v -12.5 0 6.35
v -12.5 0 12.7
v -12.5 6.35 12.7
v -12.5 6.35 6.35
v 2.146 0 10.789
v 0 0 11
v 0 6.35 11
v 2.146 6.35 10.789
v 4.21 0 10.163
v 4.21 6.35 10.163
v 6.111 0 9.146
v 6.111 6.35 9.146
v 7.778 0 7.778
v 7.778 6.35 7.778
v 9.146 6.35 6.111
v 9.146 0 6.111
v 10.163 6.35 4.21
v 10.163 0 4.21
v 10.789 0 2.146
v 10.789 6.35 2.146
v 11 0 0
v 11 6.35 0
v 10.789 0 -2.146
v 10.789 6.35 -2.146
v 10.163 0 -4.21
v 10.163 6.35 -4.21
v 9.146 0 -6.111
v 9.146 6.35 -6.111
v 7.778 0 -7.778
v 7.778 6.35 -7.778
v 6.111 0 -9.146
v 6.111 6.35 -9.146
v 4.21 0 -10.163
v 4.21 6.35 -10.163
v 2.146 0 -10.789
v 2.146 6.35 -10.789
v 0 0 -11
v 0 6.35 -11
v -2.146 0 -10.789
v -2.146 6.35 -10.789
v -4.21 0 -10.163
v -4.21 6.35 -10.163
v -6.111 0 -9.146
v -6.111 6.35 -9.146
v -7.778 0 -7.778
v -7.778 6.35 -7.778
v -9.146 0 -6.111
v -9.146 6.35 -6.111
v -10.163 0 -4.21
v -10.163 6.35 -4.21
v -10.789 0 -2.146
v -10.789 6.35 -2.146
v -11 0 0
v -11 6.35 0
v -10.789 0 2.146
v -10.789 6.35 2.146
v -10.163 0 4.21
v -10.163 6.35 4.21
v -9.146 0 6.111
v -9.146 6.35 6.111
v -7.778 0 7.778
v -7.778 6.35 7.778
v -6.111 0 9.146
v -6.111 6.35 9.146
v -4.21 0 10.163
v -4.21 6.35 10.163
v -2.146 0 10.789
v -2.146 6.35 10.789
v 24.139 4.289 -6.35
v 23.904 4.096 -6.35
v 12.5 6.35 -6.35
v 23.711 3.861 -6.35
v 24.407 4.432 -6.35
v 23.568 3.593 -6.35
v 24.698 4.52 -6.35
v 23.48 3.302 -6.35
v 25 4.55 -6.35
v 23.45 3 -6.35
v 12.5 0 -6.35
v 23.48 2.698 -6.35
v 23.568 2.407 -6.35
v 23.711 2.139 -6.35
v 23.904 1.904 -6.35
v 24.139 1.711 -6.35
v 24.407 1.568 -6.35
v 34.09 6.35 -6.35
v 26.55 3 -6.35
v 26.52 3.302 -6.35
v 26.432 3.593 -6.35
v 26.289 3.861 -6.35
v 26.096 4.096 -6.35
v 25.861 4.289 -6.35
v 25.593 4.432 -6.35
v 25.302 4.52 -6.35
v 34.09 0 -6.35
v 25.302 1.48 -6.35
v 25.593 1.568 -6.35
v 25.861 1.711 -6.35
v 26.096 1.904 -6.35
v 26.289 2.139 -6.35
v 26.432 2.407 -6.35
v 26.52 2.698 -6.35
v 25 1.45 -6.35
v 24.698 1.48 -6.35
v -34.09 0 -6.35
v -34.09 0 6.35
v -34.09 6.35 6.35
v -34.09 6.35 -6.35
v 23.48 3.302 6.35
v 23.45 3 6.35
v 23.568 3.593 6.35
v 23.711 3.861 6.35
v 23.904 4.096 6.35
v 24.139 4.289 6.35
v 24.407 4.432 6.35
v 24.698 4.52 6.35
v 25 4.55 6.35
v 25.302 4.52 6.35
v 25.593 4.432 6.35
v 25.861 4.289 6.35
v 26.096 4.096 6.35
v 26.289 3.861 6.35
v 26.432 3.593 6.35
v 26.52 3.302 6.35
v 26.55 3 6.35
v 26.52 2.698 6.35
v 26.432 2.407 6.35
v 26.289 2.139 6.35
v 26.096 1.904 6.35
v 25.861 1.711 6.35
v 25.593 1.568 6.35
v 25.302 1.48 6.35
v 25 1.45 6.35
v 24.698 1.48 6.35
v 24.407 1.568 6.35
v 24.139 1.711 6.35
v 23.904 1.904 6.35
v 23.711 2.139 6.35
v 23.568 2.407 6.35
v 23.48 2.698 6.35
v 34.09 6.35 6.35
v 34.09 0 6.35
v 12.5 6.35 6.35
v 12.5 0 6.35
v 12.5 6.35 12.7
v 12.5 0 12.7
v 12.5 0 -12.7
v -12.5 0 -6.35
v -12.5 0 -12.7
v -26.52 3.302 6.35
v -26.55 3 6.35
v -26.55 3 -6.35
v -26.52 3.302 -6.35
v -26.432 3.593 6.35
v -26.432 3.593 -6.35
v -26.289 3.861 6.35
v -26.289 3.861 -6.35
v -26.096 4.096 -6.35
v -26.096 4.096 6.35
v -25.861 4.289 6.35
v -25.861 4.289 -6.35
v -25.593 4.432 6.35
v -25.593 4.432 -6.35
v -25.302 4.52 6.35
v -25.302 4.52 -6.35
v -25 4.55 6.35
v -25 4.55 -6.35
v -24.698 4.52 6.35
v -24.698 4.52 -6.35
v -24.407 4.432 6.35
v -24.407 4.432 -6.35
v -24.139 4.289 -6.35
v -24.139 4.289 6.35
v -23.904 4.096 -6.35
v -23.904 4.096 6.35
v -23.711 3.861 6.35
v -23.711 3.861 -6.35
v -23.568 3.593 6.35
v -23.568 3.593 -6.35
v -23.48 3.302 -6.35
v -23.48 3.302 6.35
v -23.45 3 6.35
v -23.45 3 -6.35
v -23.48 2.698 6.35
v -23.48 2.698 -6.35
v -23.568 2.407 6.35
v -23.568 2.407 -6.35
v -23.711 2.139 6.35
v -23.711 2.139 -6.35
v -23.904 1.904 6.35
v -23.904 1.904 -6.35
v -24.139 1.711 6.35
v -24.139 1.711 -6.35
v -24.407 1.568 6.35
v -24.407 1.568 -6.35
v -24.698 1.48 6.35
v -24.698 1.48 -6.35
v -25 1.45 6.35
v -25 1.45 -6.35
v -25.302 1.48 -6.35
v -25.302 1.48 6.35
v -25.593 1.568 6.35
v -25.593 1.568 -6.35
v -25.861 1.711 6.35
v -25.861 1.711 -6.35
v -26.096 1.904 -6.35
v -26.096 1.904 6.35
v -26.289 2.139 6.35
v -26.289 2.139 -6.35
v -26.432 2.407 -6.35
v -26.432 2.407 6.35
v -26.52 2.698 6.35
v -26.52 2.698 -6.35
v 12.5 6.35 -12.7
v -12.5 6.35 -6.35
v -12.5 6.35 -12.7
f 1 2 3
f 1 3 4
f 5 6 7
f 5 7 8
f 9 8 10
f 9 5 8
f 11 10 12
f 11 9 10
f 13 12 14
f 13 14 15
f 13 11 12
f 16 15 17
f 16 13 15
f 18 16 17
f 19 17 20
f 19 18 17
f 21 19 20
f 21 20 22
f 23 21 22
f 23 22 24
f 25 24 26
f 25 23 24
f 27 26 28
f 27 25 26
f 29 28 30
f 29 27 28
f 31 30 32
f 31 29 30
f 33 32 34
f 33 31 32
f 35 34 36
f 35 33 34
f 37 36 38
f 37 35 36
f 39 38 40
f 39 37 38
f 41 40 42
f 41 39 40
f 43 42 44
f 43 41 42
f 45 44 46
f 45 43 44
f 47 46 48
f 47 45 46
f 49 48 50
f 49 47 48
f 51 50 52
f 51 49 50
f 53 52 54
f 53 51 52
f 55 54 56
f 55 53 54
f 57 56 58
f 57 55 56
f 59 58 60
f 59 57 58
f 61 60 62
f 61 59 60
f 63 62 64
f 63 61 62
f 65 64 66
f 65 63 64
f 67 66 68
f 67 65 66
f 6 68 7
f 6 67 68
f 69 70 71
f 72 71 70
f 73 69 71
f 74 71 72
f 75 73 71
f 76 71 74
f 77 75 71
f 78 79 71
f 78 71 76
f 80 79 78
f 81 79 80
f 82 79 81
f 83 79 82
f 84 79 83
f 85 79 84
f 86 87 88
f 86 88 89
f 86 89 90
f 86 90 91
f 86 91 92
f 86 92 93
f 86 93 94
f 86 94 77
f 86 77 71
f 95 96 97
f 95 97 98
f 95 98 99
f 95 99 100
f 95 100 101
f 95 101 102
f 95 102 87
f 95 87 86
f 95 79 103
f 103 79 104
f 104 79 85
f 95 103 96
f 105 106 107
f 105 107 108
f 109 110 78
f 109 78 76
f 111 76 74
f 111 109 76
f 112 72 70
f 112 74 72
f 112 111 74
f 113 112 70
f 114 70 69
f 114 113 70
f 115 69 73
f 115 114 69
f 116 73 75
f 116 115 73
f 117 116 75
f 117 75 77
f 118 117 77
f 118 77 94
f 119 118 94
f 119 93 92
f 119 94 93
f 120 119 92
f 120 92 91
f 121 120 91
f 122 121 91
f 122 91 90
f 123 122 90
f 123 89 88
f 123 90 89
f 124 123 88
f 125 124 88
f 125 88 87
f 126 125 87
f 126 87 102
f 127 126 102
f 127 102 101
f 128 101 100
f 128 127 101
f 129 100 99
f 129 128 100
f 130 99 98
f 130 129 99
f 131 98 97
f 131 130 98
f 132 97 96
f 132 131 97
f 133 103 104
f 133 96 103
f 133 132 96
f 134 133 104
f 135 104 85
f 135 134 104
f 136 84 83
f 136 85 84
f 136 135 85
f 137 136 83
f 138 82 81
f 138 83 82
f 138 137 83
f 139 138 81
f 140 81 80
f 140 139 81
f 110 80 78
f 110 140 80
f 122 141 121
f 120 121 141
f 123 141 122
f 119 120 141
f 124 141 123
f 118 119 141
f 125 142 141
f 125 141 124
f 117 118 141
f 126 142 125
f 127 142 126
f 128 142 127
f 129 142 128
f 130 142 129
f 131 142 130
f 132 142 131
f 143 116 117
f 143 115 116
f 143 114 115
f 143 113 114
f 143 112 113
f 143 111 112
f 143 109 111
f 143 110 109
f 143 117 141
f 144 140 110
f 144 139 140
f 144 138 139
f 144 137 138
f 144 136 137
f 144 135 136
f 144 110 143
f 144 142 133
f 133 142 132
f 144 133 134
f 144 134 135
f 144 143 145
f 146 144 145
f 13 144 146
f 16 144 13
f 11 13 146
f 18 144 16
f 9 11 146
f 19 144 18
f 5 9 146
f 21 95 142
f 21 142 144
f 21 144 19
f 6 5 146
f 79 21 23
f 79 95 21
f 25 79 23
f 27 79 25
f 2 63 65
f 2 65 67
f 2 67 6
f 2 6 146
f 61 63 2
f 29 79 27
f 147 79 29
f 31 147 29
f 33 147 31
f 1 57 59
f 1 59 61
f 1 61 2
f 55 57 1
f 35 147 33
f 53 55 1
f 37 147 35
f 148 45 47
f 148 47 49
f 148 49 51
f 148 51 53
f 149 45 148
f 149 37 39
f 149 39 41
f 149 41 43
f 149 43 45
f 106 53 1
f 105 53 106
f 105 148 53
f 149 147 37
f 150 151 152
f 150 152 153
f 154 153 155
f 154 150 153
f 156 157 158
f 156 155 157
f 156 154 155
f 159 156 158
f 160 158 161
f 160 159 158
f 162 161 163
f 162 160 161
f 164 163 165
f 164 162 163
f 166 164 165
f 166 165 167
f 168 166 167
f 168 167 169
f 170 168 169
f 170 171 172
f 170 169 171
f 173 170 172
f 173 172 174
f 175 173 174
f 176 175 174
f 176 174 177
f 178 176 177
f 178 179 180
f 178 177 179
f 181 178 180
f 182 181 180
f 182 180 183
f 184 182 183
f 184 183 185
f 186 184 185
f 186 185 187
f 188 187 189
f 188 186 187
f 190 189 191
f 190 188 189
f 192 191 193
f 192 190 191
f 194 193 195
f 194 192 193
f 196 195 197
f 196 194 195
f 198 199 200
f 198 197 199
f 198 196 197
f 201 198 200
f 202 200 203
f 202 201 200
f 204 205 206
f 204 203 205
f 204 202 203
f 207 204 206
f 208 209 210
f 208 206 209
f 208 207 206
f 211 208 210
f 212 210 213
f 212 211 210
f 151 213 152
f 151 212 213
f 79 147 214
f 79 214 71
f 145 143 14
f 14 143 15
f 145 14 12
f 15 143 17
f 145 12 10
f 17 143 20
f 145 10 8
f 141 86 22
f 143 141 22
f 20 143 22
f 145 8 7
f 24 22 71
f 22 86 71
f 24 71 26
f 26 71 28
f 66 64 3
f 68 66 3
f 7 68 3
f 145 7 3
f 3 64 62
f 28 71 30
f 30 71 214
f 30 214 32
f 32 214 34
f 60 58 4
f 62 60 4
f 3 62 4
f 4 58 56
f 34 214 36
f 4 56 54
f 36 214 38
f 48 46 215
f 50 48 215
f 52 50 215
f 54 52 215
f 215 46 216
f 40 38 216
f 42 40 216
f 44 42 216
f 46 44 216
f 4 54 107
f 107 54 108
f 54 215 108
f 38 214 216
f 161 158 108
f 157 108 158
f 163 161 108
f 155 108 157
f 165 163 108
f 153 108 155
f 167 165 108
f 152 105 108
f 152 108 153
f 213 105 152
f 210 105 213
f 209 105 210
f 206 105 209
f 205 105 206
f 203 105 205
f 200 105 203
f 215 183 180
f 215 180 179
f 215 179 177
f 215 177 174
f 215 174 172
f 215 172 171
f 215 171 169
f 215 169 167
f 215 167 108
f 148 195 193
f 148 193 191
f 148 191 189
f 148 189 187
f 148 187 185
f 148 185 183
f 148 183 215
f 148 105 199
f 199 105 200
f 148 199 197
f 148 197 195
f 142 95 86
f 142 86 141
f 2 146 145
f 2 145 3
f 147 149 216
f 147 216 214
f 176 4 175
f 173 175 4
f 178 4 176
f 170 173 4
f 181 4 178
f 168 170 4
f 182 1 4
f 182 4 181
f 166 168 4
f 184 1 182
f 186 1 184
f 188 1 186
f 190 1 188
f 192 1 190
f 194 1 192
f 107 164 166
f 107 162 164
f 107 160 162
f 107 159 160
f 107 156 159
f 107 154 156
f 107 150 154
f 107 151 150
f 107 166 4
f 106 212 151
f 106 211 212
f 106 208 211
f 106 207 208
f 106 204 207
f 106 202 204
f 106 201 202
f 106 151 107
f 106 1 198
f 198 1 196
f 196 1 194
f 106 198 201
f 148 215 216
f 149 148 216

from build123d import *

# Parameters (mm, degrees)
SKETCH1_R               = 11
BOSS_EXTRUDE1_DEPTH     = 6.35
CUT_EXTRUDE1_DEPTH      = 40.56454347
CUT_EXTRUDE1_DEPTH_BACK = 40.56454347
SKETCH2_R               = 1.55


with BuildPart() as part:
    # Sketch1 → Boss-Extrude1 (new body)
    with BuildSketch(Plane(origin=(0, 0, 0), x_dir=(1, 0, 0), z_dir=(0, 1, 0))):
        Polygon((-34.09, 6.35), (-12.5, 6.35), (-12.5, 12.7), (12.5, 12.7), (12.5, 6.35), (34.09, 6.35), (34.09, -6.35), (12.5, -6.35), (12.5, -12.7), (-12.5, -12.7), (-12.5, -6.35), (-34.09, -6.35), align=None)
        with Locations(Location((0, 0, 0), (0, 0, 270))):
            Circle(SKETCH1_R, mode=Mode.SUBTRACT)
    extrude(amount=BOSS_EXTRUDE1_DEPTH)

    # Sketch2 → Cut-Extrude1 (cut, two sides: drawn at the far end of the back side and taken through both)
    with BuildSketch(Plane(origin=(0, 0, -6.35), x_dir=(-1, 0, 0), z_dir=(0, 0, -1)).offset(-CUT_EXTRUDE1_DEPTH_BACK)):
        with Locations((25, 3)):
            Circle(SKETCH2_R)
        with Locations((-25, 3)):
            Circle(SKETCH2_R)
    extrude(amount=CUT_EXTRUDE1_DEPTH + CUT_EXTRUDE1_DEPTH_BACK, mode=Mode.SUBTRACT)


solid = part.part
